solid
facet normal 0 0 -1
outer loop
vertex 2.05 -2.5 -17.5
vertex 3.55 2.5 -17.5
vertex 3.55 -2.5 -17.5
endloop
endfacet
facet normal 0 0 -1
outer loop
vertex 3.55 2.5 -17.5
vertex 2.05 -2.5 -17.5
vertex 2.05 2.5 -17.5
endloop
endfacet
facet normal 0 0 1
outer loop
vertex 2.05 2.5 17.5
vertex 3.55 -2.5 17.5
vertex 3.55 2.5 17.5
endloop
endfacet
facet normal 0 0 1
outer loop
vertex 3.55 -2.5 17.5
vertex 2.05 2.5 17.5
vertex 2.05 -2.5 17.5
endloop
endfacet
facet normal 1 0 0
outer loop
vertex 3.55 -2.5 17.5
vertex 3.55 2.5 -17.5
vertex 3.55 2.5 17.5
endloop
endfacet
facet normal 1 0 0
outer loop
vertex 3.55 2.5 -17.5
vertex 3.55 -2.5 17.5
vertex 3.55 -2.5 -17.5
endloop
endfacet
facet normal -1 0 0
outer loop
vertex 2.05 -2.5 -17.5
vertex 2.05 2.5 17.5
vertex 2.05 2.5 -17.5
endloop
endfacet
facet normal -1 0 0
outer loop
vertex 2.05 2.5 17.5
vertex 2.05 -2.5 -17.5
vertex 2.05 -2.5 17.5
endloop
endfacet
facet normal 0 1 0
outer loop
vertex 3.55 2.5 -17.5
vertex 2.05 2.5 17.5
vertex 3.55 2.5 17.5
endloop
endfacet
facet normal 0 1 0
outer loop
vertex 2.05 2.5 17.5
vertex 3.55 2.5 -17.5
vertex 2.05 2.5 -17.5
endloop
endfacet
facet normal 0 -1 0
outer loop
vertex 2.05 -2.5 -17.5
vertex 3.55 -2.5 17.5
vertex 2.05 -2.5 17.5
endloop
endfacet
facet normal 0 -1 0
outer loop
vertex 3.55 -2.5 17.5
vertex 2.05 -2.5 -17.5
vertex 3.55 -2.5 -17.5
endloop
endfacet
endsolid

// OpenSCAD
//globals
$fn=50;
obj_round = 50;
obj_height = 50;
shaft = 5.2;

module master(){
	module rightGear(twist) {
		rotate([0, 0, -25]) {
			translate([0, 0, obj_height/4])
			linear_extrude(height = obj_height/2, center = true, twist = twist, convexity = 10)
			    import (file = "small_gear.dxf", layer = "Layer_1");
				circle(r = 1);
		}
	}

module gearObject() {

	module gear() {

		union() {
			rightGear(twist);
			mirror([0,0,1]) rightGear(twist);
		}

	}

	module hole() {	
		cylinder(d=shaft, h=obj_height*2.1, center=true);
	}
	module bone() {
		difference() {
			gear(twist=81);

			hole();
		}
	}
	union() {
		translate([5.6/2, 0, 0]) cube([1.5,5,obj_height], center=true);
		bone();
	}
}
gearObject();
}

intersection(){
cylinder(h=35, d=20, center=true);
master();
}
